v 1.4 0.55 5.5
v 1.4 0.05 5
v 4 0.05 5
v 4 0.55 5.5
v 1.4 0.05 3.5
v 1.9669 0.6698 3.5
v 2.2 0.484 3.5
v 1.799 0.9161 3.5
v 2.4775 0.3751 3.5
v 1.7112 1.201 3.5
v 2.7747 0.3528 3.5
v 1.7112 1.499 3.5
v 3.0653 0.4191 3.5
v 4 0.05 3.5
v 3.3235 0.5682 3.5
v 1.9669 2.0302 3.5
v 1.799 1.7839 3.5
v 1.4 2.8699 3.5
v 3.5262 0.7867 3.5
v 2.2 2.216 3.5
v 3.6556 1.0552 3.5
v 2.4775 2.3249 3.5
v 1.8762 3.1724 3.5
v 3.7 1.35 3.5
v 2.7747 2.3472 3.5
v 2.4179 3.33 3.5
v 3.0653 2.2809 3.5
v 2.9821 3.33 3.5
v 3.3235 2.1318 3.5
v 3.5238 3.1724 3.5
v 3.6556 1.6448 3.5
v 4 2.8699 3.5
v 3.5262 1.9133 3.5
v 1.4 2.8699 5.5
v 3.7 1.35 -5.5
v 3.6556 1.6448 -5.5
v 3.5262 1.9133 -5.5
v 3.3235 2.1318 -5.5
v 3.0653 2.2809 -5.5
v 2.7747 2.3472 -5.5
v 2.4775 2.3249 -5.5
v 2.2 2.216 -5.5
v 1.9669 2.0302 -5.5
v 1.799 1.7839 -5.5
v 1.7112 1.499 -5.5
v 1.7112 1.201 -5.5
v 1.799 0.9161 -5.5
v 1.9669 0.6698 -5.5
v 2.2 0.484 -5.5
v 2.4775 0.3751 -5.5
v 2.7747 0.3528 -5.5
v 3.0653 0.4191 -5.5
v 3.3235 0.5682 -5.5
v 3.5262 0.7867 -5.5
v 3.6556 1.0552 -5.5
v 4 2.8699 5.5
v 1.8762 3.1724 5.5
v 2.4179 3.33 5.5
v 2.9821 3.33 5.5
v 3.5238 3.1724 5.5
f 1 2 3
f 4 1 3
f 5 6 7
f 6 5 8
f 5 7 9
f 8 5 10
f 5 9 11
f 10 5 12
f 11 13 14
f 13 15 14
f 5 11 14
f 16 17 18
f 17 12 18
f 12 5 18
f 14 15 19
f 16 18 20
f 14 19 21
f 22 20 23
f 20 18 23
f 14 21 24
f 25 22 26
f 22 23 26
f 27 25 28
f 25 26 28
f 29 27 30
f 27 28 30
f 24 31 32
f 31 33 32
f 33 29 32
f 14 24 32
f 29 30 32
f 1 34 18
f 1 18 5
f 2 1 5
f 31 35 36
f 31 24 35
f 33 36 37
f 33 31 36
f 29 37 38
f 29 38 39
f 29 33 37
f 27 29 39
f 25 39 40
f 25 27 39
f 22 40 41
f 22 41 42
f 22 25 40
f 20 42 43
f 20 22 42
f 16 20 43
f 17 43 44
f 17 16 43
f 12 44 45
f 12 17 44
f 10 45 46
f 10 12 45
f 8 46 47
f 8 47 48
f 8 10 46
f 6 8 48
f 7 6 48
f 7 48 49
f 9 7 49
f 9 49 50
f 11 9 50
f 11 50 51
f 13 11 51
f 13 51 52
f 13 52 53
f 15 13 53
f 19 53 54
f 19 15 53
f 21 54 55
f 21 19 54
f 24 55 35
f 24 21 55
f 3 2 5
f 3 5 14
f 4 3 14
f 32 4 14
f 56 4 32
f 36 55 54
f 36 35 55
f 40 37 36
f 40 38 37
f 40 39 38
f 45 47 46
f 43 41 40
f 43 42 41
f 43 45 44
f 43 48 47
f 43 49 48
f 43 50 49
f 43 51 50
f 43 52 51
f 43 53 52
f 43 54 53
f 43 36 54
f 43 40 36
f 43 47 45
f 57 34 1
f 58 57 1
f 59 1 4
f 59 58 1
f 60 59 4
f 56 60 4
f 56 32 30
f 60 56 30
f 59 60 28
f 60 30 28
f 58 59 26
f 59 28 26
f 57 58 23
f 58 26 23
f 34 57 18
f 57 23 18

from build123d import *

# Parameters (mm, degrees)
ESQUISSE1_R                  = 1
BOSS_EXTRU_1_DEPTH           = 3.5
BOSS_EXTRU_1_DEPTH_BACK      = 11
ESQUISSE2_R                  = 2
BOSS_EXTRU_2_DEPTH           = 2
ESQUISSE3_OUTSIDE_W          = 9.488
ESQUISSE3_OUTSIDE_H          = 9.488
ENL_V_MAT_EXTRU_1_DEPTH      = 1
ENL_V_MAT_EXTRU_1_DEPTH_BACK = 17.5
CHANFREIN1_SIZE              = 0.5
ESQUISSE4_R                  = 1
ENL_V_MAT_EXTRU_2_DEPTH      = 5.5


with BuildPart() as part:
    # Esquisse1 → Boss.-Extru.1 (new body, two sides)
    with BuildSketch(Plane.XY) as boss_extru_1_sk:
        with Locations((2.7, 1.35)):
            Circle(ESQUISSE1_R)
    extrude(amount=BOSS_EXTRU_1_DEPTH)
    extrude(boss_extru_1_sk.sketch, amount=-BOSS_EXTRU_1_DEPTH_BACK)

    # Esquisse2 → Boss.-Extru.2 (add)
    with BuildSketch(Plane.XY.offset(3.5)):
        with Locations((2.7, 1.35)):
            Circle(ESQUISSE2_R)
    extrude(amount=BOSS_EXTRU_2_DEPTH)

    # Esquisse3 outside → Enlèv. mat.-Extru.1 (cut, two sides)
    with BuildSketch(Plane.XY.offset(5.5)) as enl_v_mat_extru_1_sk:
        with Locations((2.7, 1.35)):
            Rectangle(ESQUISSE3_OUTSIDE_W, ESQUISSE3_OUTSIDE_H)
        with BuildLine():
            Line((1.4, 2.869868415), (1.4, 0.05))
            Line((1.4, 0.05), (4, 0.05))
            Line((4, 0.05), (4, 2.869868415))
            ThreePointArc((4, 2.869868415), (2.7, 3.35), (1.4, 2.869868415))
        make_face(mode=Mode.SUBTRACT)
    extrude(amount=ENL_V_MAT_EXTRU_1_DEPTH, mode=Mode.SUBTRACT)
    extrude(enl_v_mat_extru_1_sk.sketch, amount=-ENL_V_MAT_EXTRU_1_DEPTH_BACK, mode=Mode.SUBTRACT)

    # Chanfrein1
    chanfrein1_edges = [part.edges().sort_by_distance(p)[0] for p in [
        (2.7, 0.05, 5.5),
    ]]
    chamfer(chanfrein1_edges, length=CHANFREIN1_SIZE)

    # Esquisse4 → Enlèv. mat.-Extru.2 (cut)
    with BuildSketch(Plane(origin=(0, 0, -11), x_dir=(-1, 0, 0), z_dir=(0, 0, -1))):
        with Locations((-2.7, 1.35)):
            Circle(ESQUISSE4_R)
    extrude(amount=-ENL_V_MAT_EXTRU_2_DEPTH, mode=Mode.SUBTRACT)


solid = part.part
